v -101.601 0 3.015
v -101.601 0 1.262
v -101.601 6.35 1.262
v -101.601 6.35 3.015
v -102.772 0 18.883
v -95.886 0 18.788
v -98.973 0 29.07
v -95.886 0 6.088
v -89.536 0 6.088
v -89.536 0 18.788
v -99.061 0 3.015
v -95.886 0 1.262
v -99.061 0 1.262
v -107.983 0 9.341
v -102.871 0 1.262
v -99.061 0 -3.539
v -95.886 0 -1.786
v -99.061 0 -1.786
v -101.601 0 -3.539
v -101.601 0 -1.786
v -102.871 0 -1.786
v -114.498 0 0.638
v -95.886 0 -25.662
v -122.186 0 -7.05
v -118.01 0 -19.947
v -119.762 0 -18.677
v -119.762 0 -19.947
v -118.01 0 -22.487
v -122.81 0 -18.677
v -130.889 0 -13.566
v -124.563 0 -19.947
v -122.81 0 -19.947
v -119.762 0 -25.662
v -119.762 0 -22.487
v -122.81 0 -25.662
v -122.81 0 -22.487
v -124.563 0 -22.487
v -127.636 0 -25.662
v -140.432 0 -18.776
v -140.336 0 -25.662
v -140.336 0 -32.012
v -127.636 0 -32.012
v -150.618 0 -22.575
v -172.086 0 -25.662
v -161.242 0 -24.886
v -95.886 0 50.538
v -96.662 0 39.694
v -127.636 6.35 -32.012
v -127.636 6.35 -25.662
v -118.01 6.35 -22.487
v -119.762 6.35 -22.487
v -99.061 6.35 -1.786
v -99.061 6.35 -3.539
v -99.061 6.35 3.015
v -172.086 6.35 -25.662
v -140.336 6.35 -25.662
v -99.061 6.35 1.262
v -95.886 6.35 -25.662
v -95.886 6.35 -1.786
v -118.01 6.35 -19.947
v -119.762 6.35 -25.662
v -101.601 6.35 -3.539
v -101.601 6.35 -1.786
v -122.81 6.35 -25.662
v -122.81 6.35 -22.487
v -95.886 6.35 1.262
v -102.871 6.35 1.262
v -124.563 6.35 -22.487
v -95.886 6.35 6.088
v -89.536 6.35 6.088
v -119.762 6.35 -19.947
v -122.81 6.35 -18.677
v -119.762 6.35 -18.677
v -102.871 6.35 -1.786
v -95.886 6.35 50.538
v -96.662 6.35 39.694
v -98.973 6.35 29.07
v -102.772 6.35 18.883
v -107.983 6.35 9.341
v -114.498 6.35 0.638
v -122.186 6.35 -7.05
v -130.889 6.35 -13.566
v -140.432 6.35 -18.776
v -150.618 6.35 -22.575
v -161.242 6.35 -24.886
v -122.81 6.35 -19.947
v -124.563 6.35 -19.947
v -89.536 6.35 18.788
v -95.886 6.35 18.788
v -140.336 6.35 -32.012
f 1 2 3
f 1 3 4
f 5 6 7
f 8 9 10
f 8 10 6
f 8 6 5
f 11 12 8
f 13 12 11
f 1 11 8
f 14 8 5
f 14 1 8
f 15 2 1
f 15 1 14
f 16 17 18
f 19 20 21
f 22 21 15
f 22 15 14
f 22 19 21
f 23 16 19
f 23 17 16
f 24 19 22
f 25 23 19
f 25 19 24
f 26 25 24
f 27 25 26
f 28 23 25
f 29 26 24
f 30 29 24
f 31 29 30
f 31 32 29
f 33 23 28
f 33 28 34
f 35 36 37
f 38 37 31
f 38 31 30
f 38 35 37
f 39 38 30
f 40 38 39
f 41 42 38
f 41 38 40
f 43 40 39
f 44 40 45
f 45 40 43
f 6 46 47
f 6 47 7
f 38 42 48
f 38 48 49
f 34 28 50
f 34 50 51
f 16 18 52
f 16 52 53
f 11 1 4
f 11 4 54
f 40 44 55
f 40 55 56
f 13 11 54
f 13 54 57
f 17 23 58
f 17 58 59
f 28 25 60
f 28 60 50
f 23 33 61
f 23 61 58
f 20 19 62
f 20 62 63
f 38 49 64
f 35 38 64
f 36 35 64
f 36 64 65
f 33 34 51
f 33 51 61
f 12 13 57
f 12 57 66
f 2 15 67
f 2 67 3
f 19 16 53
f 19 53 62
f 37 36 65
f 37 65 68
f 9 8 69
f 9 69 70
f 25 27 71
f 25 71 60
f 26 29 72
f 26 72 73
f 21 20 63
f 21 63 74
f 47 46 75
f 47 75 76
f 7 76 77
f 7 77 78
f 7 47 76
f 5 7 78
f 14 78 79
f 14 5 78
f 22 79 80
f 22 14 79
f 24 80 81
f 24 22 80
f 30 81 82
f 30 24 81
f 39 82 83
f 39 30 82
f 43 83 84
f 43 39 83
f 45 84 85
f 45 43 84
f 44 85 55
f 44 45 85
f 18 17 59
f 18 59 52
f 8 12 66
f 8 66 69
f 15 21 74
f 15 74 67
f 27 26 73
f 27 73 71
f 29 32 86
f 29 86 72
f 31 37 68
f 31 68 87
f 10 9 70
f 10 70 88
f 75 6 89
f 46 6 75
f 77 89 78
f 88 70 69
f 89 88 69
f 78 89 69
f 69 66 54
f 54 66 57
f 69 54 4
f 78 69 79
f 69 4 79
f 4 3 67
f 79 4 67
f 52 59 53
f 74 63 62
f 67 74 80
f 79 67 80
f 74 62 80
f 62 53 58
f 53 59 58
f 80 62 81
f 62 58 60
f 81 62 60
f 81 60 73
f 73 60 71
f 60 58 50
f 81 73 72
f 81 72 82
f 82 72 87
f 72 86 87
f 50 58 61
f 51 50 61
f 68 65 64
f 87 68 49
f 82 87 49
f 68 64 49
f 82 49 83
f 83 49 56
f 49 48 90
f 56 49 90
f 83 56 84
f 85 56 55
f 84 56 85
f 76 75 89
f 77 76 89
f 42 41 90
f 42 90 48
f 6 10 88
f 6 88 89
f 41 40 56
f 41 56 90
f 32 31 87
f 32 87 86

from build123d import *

# Parameters (mm, degrees)
BOSS_EXTRUDE1_DEPTH = 6.35


with BuildPart() as part:
    # Sketch1 → Boss-Extrude1 (new body)
    with BuildSketch(Plane(origin=(0, 0, 0), x_dir=(1, 0, 0), z_dir=(0, 1, 0))):
        with BuildLine():
            Line((-172.086243064, 25.662027693), (-140.336243064, 25.662027693))
            Line((-140.336243064, 25.662027693), (-140.336243064, 32.012027693))
            Line((-140.336243064, 32.012027693), (-127.636243064, 32.012027693))
            Line((-127.636243064, 32.012027693), (-127.636243064, 25.662027693))
            Line((-127.636243064, 25.662027693), (-122.810172742, 25.662027693))
            Line((-122.810172742, 25.662027693), (-122.810172742, 22.487027693))
            Line((-122.810172742, 22.487027693), (-124.562772742, 22.487027693))
            Line((-124.562772742, 22.487027693), (-124.562772742, 19.947027693))
            Line((-124.562772742, 19.947027693), (-122.810172742, 19.947027693))
            Line((-122.810172742, 19.947027693), (-122.810172742, 18.677027693))
            Line((-122.810172742, 18.677027693), (-119.762313386, 18.677027693))
            Line((-119.762313386, 18.677027693), (-119.762313386, 19.947027693))
            Line((-119.762313386, 19.947027693), (-118.009713386, 19.947027693))
            Line((-118.009713386, 19.947027693), (-118.009713386, 22.487027693))
            Line((-118.009713386, 22.487027693), (-119.762313386, 22.487027693))
            Line((-119.762313386, 22.487027693), (-119.762313386, 25.662027693))
            Line((-119.762313386, 25.662027693), (-95.886243064, 25.662027693))
            Line((-95.886243064, 25.662027693), (-95.886243064, 1.785957371))
            Line((-95.886243064, 1.785957371), (-99.061243064, 1.785957371))
            Line((-99.061243064, 1.785957371), (-99.061243064, 3.538557371))
            Line((-99.061243064, 3.538557371), (-101.601243064, 3.538557371))
            Line((-101.601243064, 3.538557371), (-101.601243064, 1.785957371))
            Line((-101.601243064, 1.785957371), (-102.871243064, 1.785957371))
            Line((-102.871243064, 1.785957371), (-102.871243064, -1.261901985))
            Line((-102.871243064, -1.261901985), (-101.601243064, -1.261901985))
            Line((-101.601243064, -1.261901985), (-101.601243064, -3.014501985))
            Line((-101.601243064, -3.014501985), (-99.061243064, -3.014501985))
            Line((-99.061243064, -3.014501985), (-99.061243064, -1.261901985))
            Line((-99.061243064, -1.261901985), (-95.886243064, -1.261901985))
            Line((-95.886243064, -1.261901985), (-95.886243064, -6.087972307))
            Line((-95.886243064, -6.087972307), (-89.536243064, -6.087972307))
            Line((-89.536243064, -6.087972307), (-89.536243064, -18.787972307))
            Line((-89.536243064, -18.787972307), (-95.886243064, -18.787972307))
            Line((-95.886243064, -18.787972307), (-95.886243064, -50.537972307))
            ThreePointArc((-95.886243064, -50.537972307), (-118.204706338, 3.34356442), (-172.086243064, 25.662027693))
        make_face()
    extrude(amount=BOSS_EXTRUDE1_DEPTH)


solid = part.part
